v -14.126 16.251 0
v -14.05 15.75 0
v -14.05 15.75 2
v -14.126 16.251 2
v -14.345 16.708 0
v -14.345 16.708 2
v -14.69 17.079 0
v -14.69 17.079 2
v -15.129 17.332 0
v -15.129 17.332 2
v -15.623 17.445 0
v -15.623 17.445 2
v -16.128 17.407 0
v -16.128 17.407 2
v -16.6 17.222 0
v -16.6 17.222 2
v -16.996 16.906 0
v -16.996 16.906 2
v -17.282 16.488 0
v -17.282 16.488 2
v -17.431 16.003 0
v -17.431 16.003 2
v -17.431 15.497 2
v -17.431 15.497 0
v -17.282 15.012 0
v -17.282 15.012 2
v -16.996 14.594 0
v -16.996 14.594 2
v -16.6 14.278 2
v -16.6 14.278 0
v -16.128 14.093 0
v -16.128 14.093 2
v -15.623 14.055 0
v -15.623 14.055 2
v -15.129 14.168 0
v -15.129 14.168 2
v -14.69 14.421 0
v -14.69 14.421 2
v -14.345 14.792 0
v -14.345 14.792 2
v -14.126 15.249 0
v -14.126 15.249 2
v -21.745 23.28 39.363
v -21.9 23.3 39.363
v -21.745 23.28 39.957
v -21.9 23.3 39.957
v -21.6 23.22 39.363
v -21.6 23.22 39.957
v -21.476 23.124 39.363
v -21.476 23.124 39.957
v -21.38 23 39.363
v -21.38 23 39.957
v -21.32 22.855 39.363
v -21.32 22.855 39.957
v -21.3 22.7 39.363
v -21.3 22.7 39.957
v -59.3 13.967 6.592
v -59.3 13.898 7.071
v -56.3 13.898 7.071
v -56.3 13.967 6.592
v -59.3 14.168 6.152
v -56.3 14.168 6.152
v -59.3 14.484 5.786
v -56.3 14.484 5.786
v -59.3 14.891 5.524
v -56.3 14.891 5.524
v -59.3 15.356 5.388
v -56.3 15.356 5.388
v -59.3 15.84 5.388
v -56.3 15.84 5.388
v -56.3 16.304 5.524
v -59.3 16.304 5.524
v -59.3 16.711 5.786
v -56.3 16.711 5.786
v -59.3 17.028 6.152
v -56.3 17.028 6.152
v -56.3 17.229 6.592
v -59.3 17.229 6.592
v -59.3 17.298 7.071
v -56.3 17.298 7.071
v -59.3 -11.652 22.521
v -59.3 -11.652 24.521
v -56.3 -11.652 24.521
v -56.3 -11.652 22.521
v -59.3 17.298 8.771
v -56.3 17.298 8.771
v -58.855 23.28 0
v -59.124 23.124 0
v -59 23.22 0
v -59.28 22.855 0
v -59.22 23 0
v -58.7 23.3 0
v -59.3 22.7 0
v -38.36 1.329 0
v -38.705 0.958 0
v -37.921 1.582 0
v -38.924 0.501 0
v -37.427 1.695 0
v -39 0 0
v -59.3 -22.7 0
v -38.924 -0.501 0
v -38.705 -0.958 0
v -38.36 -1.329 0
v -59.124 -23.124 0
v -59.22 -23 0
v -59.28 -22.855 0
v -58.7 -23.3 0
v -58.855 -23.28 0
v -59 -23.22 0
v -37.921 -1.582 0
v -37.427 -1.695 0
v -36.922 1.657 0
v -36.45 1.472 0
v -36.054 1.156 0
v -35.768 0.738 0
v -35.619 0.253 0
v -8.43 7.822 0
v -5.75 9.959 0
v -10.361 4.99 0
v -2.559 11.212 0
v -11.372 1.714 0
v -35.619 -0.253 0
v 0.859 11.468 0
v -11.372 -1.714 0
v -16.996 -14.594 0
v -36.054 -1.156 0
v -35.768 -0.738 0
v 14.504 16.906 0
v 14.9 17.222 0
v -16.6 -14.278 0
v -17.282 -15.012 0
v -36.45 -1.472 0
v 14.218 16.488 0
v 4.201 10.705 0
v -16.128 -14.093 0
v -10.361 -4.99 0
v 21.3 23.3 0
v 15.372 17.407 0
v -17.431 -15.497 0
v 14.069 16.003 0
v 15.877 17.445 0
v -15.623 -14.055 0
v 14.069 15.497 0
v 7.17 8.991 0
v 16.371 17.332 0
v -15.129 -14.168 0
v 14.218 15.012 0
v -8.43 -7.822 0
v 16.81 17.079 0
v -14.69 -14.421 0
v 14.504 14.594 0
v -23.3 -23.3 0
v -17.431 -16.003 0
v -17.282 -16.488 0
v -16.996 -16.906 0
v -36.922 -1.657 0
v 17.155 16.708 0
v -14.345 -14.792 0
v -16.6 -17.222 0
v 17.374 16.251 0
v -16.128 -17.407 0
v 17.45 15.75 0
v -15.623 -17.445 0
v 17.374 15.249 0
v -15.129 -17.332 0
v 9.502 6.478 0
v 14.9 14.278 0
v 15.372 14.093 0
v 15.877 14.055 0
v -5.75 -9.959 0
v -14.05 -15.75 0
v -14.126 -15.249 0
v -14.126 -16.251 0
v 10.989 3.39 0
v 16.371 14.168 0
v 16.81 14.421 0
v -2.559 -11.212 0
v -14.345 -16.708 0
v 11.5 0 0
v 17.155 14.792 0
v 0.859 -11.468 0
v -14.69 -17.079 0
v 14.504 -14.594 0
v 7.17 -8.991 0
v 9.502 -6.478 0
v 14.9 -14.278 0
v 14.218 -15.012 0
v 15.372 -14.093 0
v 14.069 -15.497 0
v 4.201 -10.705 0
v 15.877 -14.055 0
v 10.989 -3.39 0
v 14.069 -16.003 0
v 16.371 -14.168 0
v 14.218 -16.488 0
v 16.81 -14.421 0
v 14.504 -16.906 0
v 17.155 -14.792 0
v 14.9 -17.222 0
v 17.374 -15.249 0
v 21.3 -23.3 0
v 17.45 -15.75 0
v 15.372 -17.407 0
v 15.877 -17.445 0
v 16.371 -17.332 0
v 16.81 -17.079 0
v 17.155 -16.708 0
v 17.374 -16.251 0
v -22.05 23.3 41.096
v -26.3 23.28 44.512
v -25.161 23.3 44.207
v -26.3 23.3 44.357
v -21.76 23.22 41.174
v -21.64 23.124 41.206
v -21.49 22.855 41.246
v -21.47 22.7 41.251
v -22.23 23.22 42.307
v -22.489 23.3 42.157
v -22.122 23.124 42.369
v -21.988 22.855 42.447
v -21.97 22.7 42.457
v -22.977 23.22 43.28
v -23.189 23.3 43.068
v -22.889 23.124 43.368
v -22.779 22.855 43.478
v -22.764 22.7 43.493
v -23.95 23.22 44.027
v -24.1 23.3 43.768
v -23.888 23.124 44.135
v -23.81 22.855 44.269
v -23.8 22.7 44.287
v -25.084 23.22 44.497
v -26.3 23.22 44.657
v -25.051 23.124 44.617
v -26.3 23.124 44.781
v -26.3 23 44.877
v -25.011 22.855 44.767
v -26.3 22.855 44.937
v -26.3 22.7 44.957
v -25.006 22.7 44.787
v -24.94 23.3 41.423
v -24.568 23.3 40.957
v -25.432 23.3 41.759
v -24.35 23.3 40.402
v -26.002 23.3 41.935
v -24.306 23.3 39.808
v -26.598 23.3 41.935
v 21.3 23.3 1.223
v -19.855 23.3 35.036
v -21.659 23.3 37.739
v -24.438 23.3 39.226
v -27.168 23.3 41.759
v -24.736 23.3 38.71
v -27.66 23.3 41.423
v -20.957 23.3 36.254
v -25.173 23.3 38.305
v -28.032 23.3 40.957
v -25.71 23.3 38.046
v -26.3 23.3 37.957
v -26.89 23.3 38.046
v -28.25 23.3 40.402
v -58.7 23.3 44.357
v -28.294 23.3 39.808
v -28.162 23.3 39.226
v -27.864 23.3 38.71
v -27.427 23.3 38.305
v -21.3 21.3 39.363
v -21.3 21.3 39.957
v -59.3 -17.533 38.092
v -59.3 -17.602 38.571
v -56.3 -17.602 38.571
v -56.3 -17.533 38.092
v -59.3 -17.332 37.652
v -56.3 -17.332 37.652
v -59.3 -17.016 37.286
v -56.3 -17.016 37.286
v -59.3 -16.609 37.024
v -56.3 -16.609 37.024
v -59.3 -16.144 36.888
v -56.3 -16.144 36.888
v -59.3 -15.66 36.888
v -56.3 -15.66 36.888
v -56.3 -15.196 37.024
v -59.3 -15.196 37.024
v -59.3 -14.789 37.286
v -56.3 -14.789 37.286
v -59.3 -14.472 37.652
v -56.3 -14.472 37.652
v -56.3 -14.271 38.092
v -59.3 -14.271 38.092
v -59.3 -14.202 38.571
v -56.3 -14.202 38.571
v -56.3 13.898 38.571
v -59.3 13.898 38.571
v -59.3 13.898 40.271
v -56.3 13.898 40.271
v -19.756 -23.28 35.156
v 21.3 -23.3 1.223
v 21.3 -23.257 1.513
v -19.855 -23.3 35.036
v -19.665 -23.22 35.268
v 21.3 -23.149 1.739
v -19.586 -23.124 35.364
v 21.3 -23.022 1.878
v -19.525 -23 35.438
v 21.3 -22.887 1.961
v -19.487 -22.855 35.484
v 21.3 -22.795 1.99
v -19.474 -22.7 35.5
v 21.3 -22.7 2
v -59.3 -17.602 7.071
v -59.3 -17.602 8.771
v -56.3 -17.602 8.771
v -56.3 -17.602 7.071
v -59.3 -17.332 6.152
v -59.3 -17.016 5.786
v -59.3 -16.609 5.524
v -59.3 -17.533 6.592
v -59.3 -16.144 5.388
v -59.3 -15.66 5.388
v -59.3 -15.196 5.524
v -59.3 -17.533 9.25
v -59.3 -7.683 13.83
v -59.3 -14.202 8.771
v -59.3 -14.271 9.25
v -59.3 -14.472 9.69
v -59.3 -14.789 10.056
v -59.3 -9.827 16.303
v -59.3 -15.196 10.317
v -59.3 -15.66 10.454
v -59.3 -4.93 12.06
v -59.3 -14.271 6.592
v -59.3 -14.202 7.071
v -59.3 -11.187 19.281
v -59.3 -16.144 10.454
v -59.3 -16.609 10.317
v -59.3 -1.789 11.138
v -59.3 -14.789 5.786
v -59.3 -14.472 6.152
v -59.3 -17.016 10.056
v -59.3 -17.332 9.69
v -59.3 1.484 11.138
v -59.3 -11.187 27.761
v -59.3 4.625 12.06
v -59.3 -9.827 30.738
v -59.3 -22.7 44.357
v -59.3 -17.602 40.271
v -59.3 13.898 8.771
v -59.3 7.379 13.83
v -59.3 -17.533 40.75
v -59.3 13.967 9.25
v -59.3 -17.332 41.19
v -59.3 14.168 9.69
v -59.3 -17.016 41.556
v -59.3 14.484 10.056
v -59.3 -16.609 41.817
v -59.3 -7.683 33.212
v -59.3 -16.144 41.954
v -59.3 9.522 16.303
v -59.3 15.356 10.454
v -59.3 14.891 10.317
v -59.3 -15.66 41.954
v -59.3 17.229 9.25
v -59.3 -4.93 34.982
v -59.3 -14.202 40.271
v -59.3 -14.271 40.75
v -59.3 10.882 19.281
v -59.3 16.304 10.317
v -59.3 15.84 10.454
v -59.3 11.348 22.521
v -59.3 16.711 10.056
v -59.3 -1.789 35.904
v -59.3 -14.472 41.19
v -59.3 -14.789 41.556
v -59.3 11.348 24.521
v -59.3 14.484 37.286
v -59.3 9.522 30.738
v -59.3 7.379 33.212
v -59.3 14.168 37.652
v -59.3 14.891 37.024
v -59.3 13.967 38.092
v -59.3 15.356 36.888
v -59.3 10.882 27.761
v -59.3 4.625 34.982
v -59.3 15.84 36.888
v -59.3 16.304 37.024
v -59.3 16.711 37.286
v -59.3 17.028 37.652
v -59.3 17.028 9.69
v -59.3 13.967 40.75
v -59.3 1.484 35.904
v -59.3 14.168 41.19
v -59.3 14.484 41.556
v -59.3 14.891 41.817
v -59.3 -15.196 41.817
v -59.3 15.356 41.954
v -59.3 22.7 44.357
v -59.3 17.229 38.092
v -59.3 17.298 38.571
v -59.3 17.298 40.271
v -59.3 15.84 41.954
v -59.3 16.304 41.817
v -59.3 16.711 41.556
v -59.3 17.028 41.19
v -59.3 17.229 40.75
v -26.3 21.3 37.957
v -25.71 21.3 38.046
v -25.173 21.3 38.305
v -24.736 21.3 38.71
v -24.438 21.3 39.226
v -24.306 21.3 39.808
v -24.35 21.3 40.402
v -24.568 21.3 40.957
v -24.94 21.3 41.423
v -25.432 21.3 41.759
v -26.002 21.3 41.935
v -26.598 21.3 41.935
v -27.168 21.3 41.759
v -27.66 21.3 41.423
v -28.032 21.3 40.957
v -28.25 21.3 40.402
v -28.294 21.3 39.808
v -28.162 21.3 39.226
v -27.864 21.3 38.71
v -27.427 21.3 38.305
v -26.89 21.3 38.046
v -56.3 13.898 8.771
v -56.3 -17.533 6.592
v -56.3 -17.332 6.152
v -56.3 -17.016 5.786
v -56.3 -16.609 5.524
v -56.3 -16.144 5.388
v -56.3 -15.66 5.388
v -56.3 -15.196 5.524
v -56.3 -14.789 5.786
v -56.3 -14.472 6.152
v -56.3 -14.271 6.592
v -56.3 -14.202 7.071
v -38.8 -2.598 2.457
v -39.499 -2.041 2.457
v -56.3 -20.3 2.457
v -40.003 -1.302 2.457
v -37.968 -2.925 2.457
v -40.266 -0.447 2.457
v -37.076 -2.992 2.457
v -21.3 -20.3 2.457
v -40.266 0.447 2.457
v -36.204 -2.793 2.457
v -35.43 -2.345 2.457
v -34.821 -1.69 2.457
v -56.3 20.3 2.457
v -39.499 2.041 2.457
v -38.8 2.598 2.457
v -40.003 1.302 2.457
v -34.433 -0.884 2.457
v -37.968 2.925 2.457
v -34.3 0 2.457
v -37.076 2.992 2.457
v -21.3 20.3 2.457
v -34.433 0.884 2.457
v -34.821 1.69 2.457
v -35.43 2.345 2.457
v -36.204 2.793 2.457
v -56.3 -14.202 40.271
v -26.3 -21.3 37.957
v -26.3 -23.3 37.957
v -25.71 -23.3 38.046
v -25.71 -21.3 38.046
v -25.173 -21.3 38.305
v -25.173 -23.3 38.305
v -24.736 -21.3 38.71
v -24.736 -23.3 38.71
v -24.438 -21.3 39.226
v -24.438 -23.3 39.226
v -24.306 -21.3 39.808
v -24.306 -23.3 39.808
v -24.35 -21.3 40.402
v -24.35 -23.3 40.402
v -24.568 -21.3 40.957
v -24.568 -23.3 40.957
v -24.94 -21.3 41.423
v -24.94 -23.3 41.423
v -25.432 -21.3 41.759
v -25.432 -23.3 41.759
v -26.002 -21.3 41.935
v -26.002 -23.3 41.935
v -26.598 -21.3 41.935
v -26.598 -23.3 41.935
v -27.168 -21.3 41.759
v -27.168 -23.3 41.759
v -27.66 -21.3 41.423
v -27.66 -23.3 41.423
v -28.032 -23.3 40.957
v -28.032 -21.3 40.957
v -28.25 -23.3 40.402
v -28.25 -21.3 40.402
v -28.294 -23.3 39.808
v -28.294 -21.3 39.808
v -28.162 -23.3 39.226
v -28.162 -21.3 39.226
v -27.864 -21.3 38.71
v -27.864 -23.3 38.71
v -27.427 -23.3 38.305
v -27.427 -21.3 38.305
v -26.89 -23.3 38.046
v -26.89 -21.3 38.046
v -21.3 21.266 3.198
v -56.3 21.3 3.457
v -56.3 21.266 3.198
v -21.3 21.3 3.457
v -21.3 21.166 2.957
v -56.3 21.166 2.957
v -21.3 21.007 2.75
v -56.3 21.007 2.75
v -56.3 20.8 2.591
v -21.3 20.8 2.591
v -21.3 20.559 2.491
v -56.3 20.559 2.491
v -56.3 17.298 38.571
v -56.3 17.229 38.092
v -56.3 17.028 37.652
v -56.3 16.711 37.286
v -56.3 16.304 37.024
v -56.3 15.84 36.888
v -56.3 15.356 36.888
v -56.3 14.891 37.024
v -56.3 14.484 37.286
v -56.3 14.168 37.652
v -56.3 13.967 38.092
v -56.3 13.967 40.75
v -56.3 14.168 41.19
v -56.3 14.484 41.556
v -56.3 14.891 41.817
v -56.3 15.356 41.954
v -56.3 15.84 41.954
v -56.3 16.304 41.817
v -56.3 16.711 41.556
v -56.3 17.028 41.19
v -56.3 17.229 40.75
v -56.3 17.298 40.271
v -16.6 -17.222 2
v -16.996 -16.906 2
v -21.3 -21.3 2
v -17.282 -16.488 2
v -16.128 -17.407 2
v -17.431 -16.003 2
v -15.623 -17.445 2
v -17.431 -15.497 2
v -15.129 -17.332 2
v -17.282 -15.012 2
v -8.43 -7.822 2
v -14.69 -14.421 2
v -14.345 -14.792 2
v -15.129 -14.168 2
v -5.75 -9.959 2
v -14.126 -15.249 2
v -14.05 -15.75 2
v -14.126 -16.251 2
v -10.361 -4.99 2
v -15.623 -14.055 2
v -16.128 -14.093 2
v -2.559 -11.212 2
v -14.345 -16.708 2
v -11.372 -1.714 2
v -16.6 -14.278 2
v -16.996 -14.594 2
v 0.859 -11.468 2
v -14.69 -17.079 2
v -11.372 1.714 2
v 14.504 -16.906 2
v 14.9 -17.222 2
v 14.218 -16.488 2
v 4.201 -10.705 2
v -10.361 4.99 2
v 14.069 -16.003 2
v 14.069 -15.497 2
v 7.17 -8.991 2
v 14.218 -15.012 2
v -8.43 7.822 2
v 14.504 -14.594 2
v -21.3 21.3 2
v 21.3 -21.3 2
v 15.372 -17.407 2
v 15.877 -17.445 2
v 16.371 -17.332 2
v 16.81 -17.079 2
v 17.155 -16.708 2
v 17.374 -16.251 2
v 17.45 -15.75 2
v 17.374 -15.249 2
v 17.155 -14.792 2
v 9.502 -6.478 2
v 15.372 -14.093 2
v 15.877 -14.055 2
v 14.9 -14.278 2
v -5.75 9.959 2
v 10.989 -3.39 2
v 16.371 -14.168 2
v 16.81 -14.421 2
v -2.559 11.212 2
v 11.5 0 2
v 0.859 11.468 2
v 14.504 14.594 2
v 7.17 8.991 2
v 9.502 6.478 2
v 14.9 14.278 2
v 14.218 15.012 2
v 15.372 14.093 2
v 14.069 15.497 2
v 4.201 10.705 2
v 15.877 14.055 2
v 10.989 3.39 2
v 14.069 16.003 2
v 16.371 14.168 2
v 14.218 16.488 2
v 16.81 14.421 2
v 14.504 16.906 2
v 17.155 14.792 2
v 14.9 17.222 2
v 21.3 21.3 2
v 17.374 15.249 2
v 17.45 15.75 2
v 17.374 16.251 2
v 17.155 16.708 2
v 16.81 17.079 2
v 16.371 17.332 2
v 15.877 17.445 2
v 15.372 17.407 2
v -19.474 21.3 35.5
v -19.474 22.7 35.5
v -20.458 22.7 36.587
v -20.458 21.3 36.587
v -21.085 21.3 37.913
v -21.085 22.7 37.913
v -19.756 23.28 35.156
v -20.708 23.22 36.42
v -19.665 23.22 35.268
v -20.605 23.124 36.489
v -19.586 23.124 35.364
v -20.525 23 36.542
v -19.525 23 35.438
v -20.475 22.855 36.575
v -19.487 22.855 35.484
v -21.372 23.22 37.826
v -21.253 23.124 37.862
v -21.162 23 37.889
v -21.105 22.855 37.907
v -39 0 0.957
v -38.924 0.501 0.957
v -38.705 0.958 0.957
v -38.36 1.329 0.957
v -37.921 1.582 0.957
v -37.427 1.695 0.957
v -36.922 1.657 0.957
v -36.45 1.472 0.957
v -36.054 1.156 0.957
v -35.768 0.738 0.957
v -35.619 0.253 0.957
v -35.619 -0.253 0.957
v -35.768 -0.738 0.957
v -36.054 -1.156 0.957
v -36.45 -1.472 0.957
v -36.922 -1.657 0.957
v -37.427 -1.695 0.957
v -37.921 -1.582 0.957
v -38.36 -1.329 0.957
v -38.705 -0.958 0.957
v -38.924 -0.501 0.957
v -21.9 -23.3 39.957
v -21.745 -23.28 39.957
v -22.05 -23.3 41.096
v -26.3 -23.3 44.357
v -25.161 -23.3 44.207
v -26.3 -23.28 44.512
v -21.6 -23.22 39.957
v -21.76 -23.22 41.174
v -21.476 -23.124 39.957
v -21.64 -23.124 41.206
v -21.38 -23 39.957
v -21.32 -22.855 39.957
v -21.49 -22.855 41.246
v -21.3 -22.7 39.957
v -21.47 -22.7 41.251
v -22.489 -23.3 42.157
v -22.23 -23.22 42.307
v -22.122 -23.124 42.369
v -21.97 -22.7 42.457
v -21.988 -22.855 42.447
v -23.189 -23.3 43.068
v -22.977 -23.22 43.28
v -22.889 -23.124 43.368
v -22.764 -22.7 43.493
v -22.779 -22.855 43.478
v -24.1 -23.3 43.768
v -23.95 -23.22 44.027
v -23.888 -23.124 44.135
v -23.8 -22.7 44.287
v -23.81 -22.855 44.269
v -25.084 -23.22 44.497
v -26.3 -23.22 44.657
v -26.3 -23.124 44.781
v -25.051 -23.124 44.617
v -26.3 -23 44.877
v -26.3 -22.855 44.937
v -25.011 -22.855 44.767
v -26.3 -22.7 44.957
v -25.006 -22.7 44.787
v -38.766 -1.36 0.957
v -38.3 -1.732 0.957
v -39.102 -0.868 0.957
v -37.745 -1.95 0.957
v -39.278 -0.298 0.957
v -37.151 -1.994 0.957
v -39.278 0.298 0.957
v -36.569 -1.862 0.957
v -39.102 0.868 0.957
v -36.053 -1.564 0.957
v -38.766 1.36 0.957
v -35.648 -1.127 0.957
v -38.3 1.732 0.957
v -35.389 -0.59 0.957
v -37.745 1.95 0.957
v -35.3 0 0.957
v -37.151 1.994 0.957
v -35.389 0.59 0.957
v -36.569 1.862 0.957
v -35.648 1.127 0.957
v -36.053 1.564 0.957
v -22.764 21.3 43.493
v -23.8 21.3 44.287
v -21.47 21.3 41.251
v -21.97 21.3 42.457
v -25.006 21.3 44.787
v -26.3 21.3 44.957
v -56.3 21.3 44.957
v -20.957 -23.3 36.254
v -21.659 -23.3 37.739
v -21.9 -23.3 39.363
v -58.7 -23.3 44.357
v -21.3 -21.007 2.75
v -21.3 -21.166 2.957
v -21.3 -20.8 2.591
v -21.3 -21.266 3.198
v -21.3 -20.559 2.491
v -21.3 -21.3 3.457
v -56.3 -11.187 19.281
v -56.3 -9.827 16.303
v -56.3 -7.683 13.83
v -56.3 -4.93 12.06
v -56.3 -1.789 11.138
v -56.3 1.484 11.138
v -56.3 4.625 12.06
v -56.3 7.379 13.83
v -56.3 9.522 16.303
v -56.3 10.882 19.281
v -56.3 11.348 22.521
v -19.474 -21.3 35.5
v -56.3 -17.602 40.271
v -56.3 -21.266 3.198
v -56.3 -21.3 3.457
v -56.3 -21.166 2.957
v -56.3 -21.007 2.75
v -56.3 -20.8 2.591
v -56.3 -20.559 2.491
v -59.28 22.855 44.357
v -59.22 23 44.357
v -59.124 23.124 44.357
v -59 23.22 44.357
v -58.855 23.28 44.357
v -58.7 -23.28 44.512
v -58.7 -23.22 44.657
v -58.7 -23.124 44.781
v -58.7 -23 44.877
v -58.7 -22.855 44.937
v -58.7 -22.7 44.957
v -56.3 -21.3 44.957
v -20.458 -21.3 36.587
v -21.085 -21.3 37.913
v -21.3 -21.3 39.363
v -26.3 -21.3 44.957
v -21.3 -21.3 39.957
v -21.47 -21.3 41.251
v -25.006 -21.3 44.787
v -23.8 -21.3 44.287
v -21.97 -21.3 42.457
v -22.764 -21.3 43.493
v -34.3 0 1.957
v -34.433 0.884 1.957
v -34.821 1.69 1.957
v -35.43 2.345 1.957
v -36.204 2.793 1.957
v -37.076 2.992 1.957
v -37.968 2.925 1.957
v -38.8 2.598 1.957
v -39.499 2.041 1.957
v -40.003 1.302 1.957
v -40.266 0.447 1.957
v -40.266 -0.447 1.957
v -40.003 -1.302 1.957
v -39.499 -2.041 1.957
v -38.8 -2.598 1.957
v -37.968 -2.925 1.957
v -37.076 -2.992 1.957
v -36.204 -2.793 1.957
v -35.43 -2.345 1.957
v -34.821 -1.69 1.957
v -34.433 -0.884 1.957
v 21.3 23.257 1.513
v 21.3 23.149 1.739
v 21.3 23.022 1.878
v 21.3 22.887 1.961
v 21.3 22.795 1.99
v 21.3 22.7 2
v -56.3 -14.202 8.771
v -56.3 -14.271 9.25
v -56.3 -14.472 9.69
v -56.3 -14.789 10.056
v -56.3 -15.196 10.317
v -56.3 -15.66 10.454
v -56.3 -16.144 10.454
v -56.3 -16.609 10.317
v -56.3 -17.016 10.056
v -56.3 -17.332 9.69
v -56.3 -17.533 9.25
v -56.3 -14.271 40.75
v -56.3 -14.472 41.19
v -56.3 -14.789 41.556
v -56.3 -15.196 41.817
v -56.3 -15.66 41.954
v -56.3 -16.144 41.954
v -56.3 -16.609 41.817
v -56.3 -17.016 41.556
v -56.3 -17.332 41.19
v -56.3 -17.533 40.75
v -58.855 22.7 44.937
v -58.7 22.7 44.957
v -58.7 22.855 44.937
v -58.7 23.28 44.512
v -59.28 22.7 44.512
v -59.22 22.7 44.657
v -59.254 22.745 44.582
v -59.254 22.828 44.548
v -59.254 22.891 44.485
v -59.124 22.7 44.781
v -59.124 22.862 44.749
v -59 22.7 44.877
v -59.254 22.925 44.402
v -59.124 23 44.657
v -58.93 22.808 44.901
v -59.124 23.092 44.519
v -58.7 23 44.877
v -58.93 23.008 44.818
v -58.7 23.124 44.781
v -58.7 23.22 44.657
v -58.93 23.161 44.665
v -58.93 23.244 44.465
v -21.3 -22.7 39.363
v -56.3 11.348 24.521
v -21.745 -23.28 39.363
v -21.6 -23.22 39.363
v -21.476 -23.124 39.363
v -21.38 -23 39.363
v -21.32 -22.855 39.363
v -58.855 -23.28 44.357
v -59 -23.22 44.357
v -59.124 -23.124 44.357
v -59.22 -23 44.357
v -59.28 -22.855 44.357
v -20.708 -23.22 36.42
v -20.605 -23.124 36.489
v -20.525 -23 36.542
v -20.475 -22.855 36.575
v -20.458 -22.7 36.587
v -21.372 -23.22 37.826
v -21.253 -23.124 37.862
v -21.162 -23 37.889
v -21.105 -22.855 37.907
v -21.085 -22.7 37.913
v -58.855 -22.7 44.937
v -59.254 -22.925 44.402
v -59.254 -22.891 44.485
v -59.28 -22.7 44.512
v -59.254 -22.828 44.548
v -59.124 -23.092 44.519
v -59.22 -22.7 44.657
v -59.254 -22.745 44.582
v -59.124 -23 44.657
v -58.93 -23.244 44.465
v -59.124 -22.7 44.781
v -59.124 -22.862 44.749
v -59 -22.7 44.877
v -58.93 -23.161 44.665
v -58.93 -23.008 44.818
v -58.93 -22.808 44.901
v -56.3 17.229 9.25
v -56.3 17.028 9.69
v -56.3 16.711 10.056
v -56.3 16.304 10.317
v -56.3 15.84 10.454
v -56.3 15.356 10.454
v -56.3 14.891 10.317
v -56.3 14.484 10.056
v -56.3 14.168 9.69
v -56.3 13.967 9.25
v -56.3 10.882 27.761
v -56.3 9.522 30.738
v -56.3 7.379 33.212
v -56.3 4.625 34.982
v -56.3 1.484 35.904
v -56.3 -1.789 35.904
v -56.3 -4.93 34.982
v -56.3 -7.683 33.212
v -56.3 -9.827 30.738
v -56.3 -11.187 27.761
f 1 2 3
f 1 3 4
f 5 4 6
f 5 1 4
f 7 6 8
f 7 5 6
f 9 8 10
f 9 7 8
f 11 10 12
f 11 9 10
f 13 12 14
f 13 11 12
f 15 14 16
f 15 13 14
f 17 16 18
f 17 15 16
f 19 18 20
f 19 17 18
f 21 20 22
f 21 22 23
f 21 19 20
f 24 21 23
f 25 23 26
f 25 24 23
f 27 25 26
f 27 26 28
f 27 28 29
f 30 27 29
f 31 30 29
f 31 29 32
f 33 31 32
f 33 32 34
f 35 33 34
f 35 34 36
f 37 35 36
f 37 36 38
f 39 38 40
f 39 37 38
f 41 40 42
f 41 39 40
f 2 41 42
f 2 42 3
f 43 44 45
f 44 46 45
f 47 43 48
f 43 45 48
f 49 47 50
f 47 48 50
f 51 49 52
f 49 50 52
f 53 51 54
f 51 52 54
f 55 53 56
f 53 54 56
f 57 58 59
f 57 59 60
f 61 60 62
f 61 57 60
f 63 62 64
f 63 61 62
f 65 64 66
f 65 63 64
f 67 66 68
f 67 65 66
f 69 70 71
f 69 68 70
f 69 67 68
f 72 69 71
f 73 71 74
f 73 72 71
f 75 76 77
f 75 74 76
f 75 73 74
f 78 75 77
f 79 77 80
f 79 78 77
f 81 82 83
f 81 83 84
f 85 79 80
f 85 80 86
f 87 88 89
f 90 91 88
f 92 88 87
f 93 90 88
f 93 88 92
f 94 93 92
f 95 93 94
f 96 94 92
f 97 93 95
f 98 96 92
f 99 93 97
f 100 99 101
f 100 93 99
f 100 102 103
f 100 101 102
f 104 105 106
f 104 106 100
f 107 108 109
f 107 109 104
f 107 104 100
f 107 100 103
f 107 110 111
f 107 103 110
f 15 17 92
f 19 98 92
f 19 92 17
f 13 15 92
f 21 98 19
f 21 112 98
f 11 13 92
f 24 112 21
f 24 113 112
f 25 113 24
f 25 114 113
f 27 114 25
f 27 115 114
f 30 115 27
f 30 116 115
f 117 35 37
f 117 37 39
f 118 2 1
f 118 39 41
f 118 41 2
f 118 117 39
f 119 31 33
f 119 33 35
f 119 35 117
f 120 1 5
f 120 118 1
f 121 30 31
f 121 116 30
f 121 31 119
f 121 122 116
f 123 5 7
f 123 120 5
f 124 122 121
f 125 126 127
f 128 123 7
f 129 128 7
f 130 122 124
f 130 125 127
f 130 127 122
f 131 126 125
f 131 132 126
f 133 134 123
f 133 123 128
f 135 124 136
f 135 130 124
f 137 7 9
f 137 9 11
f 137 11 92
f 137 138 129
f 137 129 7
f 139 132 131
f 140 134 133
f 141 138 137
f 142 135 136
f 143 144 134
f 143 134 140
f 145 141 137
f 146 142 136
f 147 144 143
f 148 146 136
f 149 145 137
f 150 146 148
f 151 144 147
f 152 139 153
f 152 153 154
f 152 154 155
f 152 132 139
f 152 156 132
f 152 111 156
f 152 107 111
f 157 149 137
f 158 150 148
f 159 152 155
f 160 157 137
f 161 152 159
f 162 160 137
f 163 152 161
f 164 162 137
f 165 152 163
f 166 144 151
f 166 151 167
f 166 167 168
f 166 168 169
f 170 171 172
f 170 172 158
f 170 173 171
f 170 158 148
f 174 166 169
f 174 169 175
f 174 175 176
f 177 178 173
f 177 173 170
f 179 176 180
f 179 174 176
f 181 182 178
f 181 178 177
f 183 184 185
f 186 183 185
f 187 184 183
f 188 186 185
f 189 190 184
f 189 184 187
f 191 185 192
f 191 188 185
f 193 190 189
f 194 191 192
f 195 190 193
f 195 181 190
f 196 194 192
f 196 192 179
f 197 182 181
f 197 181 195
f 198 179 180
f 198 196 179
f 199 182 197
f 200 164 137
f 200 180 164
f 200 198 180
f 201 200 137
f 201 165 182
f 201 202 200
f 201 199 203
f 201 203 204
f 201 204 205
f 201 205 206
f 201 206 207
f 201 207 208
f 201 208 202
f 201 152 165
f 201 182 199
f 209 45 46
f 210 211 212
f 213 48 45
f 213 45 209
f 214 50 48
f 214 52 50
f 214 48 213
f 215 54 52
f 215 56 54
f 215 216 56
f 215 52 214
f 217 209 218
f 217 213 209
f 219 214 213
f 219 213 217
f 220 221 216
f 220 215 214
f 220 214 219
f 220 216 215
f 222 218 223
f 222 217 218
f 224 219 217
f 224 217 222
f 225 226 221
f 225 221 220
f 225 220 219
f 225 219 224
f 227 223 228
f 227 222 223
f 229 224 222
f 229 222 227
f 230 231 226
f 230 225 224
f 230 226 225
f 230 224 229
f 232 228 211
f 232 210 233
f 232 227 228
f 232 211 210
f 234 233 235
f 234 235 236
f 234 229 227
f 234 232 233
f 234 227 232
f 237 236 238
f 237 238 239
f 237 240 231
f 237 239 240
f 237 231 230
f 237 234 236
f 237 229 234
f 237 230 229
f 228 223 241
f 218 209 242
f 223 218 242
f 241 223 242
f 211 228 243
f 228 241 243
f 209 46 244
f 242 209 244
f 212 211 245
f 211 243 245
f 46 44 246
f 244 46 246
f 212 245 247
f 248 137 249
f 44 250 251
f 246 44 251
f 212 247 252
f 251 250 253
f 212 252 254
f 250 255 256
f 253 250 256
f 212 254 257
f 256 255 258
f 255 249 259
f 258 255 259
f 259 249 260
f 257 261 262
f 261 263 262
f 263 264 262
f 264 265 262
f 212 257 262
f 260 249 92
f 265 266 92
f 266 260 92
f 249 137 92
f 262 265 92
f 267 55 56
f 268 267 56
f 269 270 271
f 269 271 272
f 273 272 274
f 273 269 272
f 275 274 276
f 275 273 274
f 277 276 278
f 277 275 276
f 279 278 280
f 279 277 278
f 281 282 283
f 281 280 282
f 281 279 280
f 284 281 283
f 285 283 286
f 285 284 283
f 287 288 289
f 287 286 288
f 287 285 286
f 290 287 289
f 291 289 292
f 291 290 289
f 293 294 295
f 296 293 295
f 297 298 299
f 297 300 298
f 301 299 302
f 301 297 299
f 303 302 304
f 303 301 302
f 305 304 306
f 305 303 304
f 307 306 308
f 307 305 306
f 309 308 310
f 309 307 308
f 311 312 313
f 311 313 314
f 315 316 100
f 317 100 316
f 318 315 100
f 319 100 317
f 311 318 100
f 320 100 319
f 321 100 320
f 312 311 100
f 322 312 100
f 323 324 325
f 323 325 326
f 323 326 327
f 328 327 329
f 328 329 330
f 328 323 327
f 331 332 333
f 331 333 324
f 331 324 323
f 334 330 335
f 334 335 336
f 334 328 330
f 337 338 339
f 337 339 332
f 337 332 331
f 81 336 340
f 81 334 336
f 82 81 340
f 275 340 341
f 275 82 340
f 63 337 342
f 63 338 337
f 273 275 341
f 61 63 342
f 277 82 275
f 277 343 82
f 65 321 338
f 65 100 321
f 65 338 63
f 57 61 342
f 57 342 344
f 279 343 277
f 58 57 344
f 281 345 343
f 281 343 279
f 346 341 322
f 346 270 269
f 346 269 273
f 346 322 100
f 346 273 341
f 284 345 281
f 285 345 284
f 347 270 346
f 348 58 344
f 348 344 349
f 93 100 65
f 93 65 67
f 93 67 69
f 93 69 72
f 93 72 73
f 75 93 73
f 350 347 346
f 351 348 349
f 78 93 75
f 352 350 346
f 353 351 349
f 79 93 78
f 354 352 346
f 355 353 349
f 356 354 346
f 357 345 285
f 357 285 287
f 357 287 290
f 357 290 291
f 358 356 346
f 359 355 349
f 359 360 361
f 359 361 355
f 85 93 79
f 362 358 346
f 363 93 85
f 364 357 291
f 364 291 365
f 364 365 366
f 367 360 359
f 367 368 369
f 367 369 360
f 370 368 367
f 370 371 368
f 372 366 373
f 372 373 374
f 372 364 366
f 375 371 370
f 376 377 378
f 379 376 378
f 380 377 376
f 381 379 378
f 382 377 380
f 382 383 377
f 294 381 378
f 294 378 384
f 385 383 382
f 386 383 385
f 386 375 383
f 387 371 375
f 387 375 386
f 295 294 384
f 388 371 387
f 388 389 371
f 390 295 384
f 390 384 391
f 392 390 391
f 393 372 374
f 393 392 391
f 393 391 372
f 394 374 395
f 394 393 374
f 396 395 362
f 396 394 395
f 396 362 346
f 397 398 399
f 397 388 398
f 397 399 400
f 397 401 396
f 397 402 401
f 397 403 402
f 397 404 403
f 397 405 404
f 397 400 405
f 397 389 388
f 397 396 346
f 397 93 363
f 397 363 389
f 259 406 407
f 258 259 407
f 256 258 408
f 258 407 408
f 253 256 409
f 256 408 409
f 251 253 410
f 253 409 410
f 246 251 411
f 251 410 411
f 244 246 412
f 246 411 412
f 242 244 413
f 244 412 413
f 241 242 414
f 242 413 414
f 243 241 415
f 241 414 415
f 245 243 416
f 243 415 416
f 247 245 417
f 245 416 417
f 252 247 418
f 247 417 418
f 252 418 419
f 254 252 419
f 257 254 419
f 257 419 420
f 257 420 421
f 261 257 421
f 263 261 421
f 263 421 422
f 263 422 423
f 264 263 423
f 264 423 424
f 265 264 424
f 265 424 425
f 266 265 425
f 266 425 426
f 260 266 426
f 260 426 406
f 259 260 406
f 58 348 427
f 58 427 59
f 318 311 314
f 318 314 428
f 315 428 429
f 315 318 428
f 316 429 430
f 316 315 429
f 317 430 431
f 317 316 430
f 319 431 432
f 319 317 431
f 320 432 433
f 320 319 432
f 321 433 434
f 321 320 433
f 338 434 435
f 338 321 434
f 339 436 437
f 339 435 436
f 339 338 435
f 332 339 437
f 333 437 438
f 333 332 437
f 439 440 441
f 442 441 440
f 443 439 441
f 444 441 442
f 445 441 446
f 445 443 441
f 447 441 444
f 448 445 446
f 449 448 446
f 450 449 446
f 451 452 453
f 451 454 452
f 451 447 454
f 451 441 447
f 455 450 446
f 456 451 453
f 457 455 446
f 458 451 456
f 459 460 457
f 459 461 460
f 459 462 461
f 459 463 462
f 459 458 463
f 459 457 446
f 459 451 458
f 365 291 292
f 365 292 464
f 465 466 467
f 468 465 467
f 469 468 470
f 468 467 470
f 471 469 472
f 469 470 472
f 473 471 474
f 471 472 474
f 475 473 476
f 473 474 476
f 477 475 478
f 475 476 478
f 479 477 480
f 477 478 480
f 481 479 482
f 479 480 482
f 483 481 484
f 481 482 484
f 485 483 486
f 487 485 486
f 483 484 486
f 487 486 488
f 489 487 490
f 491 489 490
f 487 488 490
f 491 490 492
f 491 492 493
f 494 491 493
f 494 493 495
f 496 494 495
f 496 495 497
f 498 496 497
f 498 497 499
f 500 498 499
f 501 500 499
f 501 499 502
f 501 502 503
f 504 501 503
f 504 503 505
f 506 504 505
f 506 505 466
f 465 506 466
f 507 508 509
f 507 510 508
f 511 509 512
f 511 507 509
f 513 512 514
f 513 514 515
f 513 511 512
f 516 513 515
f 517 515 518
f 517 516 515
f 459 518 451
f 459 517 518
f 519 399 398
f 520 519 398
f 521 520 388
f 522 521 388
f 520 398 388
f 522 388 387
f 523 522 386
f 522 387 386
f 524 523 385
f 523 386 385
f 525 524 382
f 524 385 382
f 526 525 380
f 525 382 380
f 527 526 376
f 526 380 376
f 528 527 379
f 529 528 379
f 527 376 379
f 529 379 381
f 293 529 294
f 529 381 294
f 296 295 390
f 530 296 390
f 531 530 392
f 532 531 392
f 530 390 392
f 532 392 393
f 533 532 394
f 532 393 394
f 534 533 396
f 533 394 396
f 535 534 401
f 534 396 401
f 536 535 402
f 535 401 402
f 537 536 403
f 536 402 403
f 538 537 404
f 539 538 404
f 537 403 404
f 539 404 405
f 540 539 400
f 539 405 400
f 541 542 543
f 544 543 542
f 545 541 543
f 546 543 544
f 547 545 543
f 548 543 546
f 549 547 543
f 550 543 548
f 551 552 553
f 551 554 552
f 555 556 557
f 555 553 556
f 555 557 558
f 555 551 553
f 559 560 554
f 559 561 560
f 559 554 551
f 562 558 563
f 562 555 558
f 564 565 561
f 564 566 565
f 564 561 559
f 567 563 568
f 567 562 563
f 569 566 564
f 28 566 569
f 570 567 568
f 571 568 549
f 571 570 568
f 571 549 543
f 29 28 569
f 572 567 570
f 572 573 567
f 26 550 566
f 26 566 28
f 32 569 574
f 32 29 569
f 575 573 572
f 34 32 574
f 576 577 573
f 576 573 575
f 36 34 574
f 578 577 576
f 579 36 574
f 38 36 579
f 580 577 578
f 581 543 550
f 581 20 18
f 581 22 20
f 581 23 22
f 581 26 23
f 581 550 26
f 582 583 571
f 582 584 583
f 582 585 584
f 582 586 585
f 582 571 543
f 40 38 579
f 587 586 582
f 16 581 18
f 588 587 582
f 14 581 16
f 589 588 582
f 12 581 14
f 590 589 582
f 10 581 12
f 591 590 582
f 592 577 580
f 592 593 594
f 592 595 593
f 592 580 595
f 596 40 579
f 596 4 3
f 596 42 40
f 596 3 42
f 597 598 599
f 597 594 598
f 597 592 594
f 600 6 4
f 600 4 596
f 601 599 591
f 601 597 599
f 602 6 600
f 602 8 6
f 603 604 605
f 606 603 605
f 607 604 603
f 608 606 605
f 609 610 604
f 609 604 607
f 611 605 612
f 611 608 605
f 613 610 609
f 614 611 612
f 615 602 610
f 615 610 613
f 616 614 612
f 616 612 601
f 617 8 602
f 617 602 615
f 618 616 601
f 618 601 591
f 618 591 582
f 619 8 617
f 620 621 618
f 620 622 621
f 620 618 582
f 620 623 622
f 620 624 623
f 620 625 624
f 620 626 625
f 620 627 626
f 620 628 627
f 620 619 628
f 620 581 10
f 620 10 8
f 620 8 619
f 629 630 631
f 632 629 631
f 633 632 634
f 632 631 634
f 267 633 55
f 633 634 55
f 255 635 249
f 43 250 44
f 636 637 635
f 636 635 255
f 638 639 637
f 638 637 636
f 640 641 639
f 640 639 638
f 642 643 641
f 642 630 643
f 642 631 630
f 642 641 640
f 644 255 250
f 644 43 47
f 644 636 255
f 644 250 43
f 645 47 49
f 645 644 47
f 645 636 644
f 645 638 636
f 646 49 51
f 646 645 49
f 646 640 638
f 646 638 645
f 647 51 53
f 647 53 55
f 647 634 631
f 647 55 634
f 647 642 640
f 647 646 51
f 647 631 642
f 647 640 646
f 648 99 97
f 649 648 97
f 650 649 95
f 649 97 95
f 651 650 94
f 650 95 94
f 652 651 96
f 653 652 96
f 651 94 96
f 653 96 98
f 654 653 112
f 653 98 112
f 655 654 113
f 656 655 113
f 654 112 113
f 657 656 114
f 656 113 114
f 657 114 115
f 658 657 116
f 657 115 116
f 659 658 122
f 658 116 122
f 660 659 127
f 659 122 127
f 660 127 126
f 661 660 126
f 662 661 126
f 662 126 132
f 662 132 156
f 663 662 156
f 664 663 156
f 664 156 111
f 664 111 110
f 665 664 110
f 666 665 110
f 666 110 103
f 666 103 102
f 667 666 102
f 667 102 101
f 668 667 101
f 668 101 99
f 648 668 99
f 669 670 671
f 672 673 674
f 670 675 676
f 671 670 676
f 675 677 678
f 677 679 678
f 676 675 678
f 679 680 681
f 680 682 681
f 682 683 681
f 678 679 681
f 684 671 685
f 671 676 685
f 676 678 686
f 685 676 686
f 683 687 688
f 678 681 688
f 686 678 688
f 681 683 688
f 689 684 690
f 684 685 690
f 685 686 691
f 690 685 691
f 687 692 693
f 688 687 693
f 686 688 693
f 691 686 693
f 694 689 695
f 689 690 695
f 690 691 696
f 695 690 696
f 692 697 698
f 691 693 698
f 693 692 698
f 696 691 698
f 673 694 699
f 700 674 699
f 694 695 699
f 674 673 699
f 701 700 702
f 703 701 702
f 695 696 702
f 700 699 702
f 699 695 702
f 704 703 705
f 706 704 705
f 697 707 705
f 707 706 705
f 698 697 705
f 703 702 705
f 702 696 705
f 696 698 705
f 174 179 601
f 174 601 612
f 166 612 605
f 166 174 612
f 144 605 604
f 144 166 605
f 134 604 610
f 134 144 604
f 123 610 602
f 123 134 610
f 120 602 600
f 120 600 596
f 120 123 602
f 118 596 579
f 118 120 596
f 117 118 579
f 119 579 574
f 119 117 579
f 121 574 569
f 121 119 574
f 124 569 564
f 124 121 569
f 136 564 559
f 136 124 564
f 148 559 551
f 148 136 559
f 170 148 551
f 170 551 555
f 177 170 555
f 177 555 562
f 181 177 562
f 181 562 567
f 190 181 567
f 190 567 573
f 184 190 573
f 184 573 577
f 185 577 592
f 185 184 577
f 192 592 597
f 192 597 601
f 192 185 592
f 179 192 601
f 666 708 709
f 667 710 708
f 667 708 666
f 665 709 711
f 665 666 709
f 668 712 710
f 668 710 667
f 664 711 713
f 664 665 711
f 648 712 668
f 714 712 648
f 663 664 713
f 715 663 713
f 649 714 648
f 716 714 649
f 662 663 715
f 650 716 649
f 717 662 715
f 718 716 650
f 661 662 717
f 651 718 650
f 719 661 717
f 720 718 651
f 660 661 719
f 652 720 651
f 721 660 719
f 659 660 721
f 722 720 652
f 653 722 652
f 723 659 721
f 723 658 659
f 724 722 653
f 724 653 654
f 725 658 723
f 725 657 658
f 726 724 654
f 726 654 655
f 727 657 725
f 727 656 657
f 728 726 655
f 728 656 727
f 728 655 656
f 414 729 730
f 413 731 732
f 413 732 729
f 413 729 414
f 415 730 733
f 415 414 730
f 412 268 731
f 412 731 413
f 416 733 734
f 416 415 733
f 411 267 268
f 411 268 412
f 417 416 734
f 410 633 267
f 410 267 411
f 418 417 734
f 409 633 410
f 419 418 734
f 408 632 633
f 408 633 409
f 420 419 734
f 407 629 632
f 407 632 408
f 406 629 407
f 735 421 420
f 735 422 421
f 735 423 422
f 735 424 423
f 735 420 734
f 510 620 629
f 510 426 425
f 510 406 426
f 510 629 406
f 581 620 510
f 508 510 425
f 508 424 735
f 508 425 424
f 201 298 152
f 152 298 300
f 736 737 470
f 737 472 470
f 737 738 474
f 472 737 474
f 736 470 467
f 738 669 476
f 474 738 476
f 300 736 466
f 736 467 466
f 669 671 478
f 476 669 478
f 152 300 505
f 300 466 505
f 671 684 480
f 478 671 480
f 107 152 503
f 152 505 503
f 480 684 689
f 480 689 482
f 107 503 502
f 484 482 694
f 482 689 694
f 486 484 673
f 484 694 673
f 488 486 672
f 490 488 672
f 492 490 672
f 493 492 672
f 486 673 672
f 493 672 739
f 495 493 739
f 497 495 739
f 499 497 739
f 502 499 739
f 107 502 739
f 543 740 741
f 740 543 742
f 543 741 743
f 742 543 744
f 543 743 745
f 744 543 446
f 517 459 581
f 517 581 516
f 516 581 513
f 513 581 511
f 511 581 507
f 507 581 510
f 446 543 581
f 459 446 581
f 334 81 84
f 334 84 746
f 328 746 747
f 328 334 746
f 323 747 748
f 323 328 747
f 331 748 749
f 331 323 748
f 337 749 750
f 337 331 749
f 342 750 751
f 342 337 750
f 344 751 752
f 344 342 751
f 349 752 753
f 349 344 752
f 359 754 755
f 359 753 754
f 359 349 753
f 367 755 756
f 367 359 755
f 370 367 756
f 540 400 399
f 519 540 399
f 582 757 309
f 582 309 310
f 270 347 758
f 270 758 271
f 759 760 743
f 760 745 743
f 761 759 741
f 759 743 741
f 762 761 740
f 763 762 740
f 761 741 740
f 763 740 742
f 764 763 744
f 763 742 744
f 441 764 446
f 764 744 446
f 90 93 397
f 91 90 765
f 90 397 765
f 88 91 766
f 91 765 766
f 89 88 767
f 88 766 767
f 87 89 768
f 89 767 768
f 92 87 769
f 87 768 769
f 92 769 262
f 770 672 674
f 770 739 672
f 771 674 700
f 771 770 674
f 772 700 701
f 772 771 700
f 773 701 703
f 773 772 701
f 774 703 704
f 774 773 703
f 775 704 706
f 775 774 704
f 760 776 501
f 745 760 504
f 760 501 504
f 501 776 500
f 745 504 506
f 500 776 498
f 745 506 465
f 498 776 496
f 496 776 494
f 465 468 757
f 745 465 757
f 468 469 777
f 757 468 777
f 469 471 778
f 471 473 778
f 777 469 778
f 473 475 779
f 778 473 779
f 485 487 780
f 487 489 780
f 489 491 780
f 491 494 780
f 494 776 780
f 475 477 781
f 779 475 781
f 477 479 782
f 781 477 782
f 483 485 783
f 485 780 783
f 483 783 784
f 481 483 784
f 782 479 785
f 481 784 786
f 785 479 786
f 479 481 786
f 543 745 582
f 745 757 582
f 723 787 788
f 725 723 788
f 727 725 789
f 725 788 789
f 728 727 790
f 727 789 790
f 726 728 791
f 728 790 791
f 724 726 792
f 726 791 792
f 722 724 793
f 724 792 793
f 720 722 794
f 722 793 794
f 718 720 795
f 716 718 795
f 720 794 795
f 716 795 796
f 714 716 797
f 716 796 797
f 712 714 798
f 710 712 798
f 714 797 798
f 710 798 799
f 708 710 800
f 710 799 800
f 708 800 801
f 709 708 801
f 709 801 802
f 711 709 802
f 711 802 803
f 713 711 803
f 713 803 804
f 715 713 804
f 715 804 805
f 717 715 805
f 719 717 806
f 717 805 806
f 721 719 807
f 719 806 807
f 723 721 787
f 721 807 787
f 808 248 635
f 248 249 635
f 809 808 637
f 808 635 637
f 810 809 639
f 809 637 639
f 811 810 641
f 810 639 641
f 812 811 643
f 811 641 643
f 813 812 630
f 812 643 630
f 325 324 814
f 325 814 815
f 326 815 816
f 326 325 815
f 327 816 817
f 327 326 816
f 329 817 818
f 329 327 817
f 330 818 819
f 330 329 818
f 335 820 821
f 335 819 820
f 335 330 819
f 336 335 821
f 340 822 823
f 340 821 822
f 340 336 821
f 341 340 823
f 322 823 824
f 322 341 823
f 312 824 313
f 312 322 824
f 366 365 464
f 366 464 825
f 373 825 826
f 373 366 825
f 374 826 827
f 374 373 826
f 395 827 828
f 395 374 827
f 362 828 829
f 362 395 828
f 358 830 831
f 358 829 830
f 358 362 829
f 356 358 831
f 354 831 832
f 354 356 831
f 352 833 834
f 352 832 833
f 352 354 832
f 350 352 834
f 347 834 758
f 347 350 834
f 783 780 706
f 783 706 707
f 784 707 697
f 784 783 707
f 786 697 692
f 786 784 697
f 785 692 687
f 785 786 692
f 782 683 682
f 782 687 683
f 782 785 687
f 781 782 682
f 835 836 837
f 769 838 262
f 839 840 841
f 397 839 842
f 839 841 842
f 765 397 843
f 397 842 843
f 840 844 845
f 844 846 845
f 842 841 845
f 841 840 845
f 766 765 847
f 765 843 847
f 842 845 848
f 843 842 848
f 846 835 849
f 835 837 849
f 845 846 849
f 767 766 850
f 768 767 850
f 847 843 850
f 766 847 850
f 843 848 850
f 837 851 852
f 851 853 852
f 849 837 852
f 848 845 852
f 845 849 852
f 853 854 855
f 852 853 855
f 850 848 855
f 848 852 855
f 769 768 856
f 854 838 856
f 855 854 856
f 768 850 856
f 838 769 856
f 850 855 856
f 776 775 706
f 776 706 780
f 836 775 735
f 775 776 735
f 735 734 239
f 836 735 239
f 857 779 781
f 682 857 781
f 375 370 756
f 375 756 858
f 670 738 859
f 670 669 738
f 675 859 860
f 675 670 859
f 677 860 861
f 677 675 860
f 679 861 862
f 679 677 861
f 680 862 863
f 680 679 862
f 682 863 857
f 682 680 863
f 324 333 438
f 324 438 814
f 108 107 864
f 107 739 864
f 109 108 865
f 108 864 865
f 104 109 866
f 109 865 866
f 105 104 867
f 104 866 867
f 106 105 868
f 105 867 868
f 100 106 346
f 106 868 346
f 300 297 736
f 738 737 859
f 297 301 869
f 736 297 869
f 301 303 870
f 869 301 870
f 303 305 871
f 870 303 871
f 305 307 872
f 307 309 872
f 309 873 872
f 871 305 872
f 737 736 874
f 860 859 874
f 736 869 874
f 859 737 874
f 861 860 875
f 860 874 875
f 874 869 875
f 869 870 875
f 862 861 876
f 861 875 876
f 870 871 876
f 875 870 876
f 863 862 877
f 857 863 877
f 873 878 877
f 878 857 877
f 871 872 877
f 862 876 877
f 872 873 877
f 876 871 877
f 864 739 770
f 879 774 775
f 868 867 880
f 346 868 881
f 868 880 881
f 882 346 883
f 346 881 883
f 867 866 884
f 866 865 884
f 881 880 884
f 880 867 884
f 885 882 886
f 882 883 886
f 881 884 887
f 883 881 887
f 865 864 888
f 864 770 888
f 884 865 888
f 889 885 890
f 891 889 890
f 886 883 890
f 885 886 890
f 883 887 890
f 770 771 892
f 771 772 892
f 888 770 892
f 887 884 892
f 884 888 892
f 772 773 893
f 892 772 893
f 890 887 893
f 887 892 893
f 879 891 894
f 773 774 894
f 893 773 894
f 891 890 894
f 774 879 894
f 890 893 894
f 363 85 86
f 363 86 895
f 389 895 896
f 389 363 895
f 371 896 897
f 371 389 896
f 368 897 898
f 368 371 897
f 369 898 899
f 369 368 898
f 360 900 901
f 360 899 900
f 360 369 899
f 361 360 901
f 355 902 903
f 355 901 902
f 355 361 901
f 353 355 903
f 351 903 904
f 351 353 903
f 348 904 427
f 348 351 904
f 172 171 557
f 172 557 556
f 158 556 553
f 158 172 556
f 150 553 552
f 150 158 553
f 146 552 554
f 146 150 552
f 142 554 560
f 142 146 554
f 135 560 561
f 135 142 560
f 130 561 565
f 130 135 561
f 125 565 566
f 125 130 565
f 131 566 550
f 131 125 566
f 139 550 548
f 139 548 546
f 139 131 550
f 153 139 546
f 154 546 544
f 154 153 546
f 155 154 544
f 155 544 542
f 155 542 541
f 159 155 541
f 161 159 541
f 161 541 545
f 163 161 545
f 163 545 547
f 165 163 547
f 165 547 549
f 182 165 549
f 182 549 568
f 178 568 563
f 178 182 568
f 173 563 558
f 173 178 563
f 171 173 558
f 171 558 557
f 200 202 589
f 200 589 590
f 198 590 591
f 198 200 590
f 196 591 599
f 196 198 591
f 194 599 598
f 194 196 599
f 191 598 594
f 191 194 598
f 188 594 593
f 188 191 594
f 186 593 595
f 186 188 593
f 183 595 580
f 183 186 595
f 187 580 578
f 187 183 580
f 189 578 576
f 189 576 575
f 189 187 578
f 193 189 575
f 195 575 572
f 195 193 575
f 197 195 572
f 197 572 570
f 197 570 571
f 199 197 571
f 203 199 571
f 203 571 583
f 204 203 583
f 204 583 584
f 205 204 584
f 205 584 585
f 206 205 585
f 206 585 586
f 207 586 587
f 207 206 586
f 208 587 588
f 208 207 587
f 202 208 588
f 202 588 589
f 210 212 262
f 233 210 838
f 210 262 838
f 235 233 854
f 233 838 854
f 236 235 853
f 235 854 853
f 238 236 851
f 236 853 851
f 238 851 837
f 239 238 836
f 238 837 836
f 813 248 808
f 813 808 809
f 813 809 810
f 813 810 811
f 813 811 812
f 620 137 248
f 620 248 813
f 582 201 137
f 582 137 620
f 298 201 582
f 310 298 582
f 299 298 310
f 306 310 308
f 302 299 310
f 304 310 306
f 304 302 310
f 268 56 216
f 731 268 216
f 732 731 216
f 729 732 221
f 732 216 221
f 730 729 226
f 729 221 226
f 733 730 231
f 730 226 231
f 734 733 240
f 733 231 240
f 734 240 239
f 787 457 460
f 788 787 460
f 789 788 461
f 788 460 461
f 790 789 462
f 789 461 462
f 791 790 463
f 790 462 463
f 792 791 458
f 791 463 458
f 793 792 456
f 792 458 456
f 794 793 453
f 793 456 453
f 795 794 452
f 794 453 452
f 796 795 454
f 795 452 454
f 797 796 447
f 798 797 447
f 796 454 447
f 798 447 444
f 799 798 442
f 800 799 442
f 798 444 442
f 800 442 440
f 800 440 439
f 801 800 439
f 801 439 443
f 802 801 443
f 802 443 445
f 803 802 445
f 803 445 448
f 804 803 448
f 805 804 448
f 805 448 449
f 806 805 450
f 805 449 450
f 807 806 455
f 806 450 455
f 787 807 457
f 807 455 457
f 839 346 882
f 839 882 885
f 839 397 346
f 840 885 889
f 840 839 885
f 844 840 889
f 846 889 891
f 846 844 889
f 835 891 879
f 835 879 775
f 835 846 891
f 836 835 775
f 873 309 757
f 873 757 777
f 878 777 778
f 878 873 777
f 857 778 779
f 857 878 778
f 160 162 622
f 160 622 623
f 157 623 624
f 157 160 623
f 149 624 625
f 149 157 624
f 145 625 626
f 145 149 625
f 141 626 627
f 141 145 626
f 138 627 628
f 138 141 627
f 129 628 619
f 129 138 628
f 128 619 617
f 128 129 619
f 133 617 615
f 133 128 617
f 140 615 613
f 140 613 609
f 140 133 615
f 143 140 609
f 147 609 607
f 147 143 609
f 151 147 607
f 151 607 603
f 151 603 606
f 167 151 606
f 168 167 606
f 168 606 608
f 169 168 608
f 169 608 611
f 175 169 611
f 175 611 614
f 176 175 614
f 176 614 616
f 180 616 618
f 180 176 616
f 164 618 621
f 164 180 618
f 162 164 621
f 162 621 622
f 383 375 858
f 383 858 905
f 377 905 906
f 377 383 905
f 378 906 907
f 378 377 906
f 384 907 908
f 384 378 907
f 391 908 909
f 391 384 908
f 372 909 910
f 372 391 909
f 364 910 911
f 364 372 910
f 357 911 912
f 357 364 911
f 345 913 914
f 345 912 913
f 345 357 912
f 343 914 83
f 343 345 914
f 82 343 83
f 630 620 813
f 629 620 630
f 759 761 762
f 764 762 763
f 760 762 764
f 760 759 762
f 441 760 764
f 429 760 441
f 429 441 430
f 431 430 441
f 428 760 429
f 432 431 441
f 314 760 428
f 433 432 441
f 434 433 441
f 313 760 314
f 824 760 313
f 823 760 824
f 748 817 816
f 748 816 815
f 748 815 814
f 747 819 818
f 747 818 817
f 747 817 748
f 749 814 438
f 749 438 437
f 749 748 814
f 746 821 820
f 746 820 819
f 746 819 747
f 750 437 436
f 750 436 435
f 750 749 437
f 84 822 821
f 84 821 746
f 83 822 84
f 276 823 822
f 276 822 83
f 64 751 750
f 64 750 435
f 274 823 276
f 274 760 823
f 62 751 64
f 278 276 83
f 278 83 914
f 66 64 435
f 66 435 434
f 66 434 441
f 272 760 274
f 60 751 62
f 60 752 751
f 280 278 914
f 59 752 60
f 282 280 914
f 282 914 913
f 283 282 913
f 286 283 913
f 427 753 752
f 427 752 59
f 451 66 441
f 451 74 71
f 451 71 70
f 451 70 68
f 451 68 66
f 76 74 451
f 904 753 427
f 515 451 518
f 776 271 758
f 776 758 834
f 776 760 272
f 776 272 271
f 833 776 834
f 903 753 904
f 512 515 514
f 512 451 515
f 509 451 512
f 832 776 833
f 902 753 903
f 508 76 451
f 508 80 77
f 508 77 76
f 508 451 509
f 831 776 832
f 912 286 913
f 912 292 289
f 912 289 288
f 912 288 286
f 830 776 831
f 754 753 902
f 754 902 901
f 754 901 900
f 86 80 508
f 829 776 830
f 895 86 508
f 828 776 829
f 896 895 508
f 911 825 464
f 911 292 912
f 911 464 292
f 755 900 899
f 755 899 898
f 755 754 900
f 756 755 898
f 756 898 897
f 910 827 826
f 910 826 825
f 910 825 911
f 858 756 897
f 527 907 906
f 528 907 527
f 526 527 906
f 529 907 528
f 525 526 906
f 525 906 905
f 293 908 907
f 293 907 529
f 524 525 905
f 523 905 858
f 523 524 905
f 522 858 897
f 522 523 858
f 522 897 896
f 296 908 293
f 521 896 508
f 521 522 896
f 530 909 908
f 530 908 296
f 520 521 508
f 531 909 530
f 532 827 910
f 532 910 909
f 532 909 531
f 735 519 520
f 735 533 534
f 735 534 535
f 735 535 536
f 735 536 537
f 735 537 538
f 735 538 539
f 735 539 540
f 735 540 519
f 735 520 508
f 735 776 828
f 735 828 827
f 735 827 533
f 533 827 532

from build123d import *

# Parameters (mm, degrees)
SKETCH_1_W               = 42.6
SKETCH_1_H               = 42.6
SKETCH_1_R               = 1.7
SKETCH_1_R_2             = 11.5
EXTRUDE_1_DEPTH          = 2
SKETCH_2_W               = 37
SKETCH_2_H               = 42.6
EXTRUDE_2_DEPTH          = 2
EXTRUDE_3_DEPTH          = 2
EXTRUDE_4_DEPTH          = 2
BOSS_EXTRUDE1_DEPTH      = 36
BOSS_EXTRUDE1_DEPTH_BACK = 2
SKETCH1_W                = 44.957073211
SKETCH1_H                = 46.6
SKETCH4_W                = 35
SKETCH4_H                = 42.6
CUT_EXTRUDE2_DEPTH       = 42.5
CUT_EXTRUDE3_REACH       = 97.186
CUT_EXTRUDE4_REACH       = 79.978
SKETCH6_R                = 1.7
SKETCH7_R                = 3
CUT_EXTRUDE5_DEPTH       = 1.5
FILLET1_R                = 5
FILLET2_R                = 1
CHAMFER1_SIZE            = 1
FILLET3_R                = 0.6
SKETCH8_R                = 2
CUT_EXTRUDE6_DEPTH       = 88.801984213


with BuildPart() as part:
    # Эскиз1 → Бобышка-Вытянуть1 (new body)
    with BuildSketch(Plane.XY):
        Rectangle(SKETCH_1_W, SKETCH_1_H)
        with Locations((-15.75, 15.75)):
            Circle(SKETCH_1_R, mode=Mode.SUBTRACT)
        with Locations((15.75, 15.75)):
            Circle(SKETCH_1_R, mode=Mode.SUBTRACT)
        with Locations((15.75, -15.75)):
            Circle(SKETCH_1_R, mode=Mode.SUBTRACT)
        with Locations((-15.75, -15.75)):
            Circle(SKETCH_1_R, mode=Mode.SUBTRACT)
        Circle(SKETCH_1_R_2, mode=Mode.SUBTRACT)
    extrude(amount=EXTRUDE_1_DEPTH)

    # Эскиз2 → Бобышка-Вытянуть2 (add)
    with BuildSketch(Plane.ZY.offset(21.3)):
        with Locations((18.5, 0)):
            Rectangle(SKETCH_2_W, SKETCH_2_H)
    extrude(amount=EXTRUDE_2_DEPTH)

    # Эскиз3 → Бобышка-Вытянуть3 (add)
    with BuildSketch(Plane.XZ.offset(21.3)):
        Polygon((-23.3, 0), (-23.3, 37), (-21.3, 37), (21.3, 2), (21.3, 0), align=None)
    extrude(amount=EXTRUDE_3_DEPTH)

    # Эскиз4 → Бобышка-Вытянуть4 (add)
    with BuildSketch(Plane(origin=(0, 21.3, 0), x_dir=(1, 0, 0), z_dir=(0, 1, 0))):
        Polygon((-23.3, -37), (-23.3, 0), (21.3, 0), (21.3, -2), (-21.3, -37), align=None)
    extrude(amount=EXTRUDE_4_DEPTH)

    # Sketch1 → Boss-Extrude1 (add, two sides: drawn at the far end of the back side and taken through both)
    with BuildSketch(Plane.ZY.offset(23.3).offset(-BOSS_EXTRUDE1_DEPTH_BACK)):
        with Locations((22.478536606, 0)):
            Rectangle(SKETCH1_W, SKETCH1_H)
    extrude(amount=BOSS_EXTRUDE1_DEPTH + BOSS_EXTRUDE1_DEPTH_BACK)

    # Sketch4 → Cut-Extrude2 (cut)
    with BuildSketch(Plane.XY.offset(44.957073211)):
        with Locations((-38.8, 0)):
            Rectangle(SKETCH4_W, SKETCH4_H)
    extrude(amount=-CUT_EXTRUDE2_DEPTH, mode=Mode.SUBTRACT)

    # Sketch5 → Cut-Extrude3 (cut, up to next)
    with BuildSketch(Plane.ZY.offset(59.3), mode=Mode.PRIVATE) as cut_extrude3_sk1:
        with BuildLine():
            Line((38.570845355, -14.202343453), (40.270845355, -14.202343453))
            ThreePointArc((40.270845355, -14.202343453), (41.970845355, -15.902343453), (40.270845355, -17.602343453))
            Line((40.270845355, -17.602343453), (38.570845355, -17.602343453))
            ThreePointArc((38.570845355, -17.602343453), (36.870845355, -15.902343453), (38.570845355, -14.202343453))
        make_face()
    cut_extrude3_tool1 = extrude(cut_extrude3_sk1.sketch, amount=-CUT_EXTRUDE3_REACH, mode=Mode.PRIVATE) & part.part
    # Sketch5 → Cut-Extrude3 (cut, up to next)
    with BuildSketch(Plane.ZY.offset(59.3), mode=Mode.PRIVATE) as cut_extrude3_sk2:
        with BuildLine():
            Line((38.570845355, 13.897656547), (40.270845355, 13.897656547))
            ThreePointArc((40.270845355, 13.897656547), (41.970845355, 15.597656547), (40.270845355, 17.297656547))
            Line((40.270845355, 17.297656547), (38.570845355, 17.297656547))
            ThreePointArc((38.570845355, 17.297656547), (36.870845355, 15.597656547), (38.570845355, 13.897656547))
        make_face()
    cut_extrude3_tool2 = extrude(cut_extrude3_sk2.sketch, amount=-CUT_EXTRUDE3_REACH, mode=Mode.PRIVATE) & part.part
    # Sketch5 → Cut-Extrude3 (cut, up to next)
    with BuildSketch(Plane.ZY.offset(59.3), mode=Mode.PRIVATE) as cut_extrude3_sk3:
        with BuildLine():
            Line((7.070845355, 17.297656547), (8.770845355, 17.297656547))
            ThreePointArc((8.770845355, 17.297656547), (10.470845355, 15.597656547), (8.770845355, 13.897656547))
            Line((8.770845355, 13.897656547), (7.070845355, 13.897656547))
            ThreePointArc((7.070845355, 13.897656547), (5.370845355, 15.597656547), (7.070845355, 17.297656547))
        make_face()
    cut_extrude3_tool3 = extrude(cut_extrude3_sk3.sketch, amount=-CUT_EXTRUDE3_REACH, mode=Mode.PRIVATE) & part.part
    # Sketch5 → Cut-Extrude3 (cut, up to next)
    with BuildSketch(Plane.ZY.offset(59.3), mode=Mode.PRIVATE) as cut_extrude3_sk4:
        with BuildLine():
            Line((7.070845355, -14.202343453), (8.770845355, -14.202343453))
            ThreePointArc((8.770845355, -14.202343453), (10.470845355, -15.902343453), (8.770845355, -17.602343453))
            Line((8.770845355, -17.602343453), (7.070845355, -17.602343453))
            ThreePointArc((7.070845355, -17.602343453), (5.370845355, -15.902343453), (7.070845355, -14.202343453))
        make_face()
    cut_extrude3_tool4 = extrude(cut_extrude3_sk4.sketch, amount=-CUT_EXTRUDE3_REACH, mode=Mode.PRIVATE) & part.part
    # Sketch5 → Cut-Extrude3 (cut, up to next)
    with BuildSketch(Plane.ZY.offset(59.3), mode=Mode.PRIVATE) as cut_extrude3_sk5:
        with BuildLine():
            Line((22.520845355, 11.347656547), (24.520845355, 11.347656547))
            ThreePointArc((24.520845355, 11.347656547), (36.020845355, -0.152343453), (24.520845355, -11.652343453))
            Line((24.520845355, -11.652343453), (22.520845355, -11.652343453))
            ThreePointArc((22.520845355, -11.652343453), (11.020845355, -0.152343453), (22.520845355, 11.347656547))
        make_face()
    cut_extrude3_tool5 = extrude(cut_extrude3_sk5.sketch, amount=-CUT_EXTRUDE3_REACH, mode=Mode.PRIVATE) & part.part
    add(cut_extrude3_tool1.solids().sort_by_distance((-59.3, -15.902343, 39.420845))[0], mode=Mode.SUBTRACT)
    add(cut_extrude3_tool2.solids().sort_by_distance((-59.3, 15.597657, 39.420845))[0], mode=Mode.SUBTRACT)
    add(cut_extrude3_tool3.solids().sort_by_distance((-59.3, 15.597657, 7.920845))[0], mode=Mode.SUBTRACT)
    add(cut_extrude3_tool4.solids().sort_by_distance((-59.3, -15.902343, 7.920845))[0], mode=Mode.SUBTRACT)
    add(cut_extrude3_tool5.solids().sort_by_distance((-59.3, -0.152343, 23.520845))[0], mode=Mode.SUBTRACT)

    # Sketch6 → Cut-Extrude4 (cut, up to next)
    with BuildSketch(Plane(origin=(0, 0, 0), x_dir=(-1, 0, 0), z_dir=(0, 0, -1)), mode=Mode.PRIVATE) as cut_extrude4_sk1:
        with Locations((37.3, 0)):
            Circle(SKETCH6_R)
    cut_extrude4_tool1 = extrude(cut_extrude4_sk1.sketch, amount=-CUT_EXTRUDE4_REACH, mode=Mode.PRIVATE) & part.part
    add(cut_extrude4_tool1.solids().sort_by_distance((-37.3, 0, 0))[0], mode=Mode.SUBTRACT)

    # Sketch7 → Cut-Extrude5 (cut)
    with BuildSketch(Plane.XY.offset(2.457073211)):
        with Locations((-37.3, 0)):
            Circle(SKETCH7_R)
    extrude(amount=-CUT_EXTRUDE5_DEPTH, mode=Mode.SUBTRACT)

    # Fillet1
    fillet1_edges = [part.edges().sort_by_distance(p)[0] for p in [
        (-21.3, 22.3, 44.957073211),
        (-21.3, -22.3, 37),
        (-21.3, 22.3, 37),
        (-21.3, -22.3, 44.957073211),
    ]]
    fillet(fillet1_edges, radius=FILLET1_R)

    # Fillet2
    fillet2_edges = [part.edges().sort_by_distance(p)[0] for p in [
        (-38.8, -21.3, 2.457073211),
        (-38.8, 21.3, 2.457073211),
    ]]
    fillet(fillet2_edges, radius=FILLET2_R)

    # Chamfer1
    chamfer1_edges = [part.edges().sort_by_distance(p)[0] for p in [
        (-40.3, 0, 0.957073211),
    ]]
    chamfer(chamfer1_edges, length=CHAMFER1_SIZE)

    # Fillet3
    fillet3_edges = [part.edges().sort_by_distance(p)[0] for p in [
        (0.912958055, 23.3, 18.749917091),
        (-21.3, 23.3, 39.660110463),
        (-21.3, -23.3, 39.660110463),
        (-42.8, 23.3, 44.957073211),
        (-42.8, -23.3, 44.957073211),
        (-22.764466094, -23.3, 43.492607117),
        (-22.764466094, 23.3, 43.492607117),
        (-20.820532018, 23.3, 37.226610733),
        (-20.820532018, -23.3, 37.226610733),
        (0.912958055, -23.3, 18.749917091),
        (-59.3, -23.3, 22.478536605),
        (-59.3, 0, 44.957073211),
        (-59.3, 23.3, 22.478536605),
    ]]
    fillet(fillet3_edges, radius=FILLET3_R)

    # Sketch8 → Cut-Extrude6 (cut, through all)
    with BuildSketch(Plane.XZ.offset(23.3)):
        with Locations(Location((-26.3, 39.957073211, 0), (0, 0, 270))):
            Circle(SKETCH8_R)
    extrude(amount=-CUT_EXTRUDE6_DEPTH, mode=Mode.SUBTRACT)


solid = part.part
